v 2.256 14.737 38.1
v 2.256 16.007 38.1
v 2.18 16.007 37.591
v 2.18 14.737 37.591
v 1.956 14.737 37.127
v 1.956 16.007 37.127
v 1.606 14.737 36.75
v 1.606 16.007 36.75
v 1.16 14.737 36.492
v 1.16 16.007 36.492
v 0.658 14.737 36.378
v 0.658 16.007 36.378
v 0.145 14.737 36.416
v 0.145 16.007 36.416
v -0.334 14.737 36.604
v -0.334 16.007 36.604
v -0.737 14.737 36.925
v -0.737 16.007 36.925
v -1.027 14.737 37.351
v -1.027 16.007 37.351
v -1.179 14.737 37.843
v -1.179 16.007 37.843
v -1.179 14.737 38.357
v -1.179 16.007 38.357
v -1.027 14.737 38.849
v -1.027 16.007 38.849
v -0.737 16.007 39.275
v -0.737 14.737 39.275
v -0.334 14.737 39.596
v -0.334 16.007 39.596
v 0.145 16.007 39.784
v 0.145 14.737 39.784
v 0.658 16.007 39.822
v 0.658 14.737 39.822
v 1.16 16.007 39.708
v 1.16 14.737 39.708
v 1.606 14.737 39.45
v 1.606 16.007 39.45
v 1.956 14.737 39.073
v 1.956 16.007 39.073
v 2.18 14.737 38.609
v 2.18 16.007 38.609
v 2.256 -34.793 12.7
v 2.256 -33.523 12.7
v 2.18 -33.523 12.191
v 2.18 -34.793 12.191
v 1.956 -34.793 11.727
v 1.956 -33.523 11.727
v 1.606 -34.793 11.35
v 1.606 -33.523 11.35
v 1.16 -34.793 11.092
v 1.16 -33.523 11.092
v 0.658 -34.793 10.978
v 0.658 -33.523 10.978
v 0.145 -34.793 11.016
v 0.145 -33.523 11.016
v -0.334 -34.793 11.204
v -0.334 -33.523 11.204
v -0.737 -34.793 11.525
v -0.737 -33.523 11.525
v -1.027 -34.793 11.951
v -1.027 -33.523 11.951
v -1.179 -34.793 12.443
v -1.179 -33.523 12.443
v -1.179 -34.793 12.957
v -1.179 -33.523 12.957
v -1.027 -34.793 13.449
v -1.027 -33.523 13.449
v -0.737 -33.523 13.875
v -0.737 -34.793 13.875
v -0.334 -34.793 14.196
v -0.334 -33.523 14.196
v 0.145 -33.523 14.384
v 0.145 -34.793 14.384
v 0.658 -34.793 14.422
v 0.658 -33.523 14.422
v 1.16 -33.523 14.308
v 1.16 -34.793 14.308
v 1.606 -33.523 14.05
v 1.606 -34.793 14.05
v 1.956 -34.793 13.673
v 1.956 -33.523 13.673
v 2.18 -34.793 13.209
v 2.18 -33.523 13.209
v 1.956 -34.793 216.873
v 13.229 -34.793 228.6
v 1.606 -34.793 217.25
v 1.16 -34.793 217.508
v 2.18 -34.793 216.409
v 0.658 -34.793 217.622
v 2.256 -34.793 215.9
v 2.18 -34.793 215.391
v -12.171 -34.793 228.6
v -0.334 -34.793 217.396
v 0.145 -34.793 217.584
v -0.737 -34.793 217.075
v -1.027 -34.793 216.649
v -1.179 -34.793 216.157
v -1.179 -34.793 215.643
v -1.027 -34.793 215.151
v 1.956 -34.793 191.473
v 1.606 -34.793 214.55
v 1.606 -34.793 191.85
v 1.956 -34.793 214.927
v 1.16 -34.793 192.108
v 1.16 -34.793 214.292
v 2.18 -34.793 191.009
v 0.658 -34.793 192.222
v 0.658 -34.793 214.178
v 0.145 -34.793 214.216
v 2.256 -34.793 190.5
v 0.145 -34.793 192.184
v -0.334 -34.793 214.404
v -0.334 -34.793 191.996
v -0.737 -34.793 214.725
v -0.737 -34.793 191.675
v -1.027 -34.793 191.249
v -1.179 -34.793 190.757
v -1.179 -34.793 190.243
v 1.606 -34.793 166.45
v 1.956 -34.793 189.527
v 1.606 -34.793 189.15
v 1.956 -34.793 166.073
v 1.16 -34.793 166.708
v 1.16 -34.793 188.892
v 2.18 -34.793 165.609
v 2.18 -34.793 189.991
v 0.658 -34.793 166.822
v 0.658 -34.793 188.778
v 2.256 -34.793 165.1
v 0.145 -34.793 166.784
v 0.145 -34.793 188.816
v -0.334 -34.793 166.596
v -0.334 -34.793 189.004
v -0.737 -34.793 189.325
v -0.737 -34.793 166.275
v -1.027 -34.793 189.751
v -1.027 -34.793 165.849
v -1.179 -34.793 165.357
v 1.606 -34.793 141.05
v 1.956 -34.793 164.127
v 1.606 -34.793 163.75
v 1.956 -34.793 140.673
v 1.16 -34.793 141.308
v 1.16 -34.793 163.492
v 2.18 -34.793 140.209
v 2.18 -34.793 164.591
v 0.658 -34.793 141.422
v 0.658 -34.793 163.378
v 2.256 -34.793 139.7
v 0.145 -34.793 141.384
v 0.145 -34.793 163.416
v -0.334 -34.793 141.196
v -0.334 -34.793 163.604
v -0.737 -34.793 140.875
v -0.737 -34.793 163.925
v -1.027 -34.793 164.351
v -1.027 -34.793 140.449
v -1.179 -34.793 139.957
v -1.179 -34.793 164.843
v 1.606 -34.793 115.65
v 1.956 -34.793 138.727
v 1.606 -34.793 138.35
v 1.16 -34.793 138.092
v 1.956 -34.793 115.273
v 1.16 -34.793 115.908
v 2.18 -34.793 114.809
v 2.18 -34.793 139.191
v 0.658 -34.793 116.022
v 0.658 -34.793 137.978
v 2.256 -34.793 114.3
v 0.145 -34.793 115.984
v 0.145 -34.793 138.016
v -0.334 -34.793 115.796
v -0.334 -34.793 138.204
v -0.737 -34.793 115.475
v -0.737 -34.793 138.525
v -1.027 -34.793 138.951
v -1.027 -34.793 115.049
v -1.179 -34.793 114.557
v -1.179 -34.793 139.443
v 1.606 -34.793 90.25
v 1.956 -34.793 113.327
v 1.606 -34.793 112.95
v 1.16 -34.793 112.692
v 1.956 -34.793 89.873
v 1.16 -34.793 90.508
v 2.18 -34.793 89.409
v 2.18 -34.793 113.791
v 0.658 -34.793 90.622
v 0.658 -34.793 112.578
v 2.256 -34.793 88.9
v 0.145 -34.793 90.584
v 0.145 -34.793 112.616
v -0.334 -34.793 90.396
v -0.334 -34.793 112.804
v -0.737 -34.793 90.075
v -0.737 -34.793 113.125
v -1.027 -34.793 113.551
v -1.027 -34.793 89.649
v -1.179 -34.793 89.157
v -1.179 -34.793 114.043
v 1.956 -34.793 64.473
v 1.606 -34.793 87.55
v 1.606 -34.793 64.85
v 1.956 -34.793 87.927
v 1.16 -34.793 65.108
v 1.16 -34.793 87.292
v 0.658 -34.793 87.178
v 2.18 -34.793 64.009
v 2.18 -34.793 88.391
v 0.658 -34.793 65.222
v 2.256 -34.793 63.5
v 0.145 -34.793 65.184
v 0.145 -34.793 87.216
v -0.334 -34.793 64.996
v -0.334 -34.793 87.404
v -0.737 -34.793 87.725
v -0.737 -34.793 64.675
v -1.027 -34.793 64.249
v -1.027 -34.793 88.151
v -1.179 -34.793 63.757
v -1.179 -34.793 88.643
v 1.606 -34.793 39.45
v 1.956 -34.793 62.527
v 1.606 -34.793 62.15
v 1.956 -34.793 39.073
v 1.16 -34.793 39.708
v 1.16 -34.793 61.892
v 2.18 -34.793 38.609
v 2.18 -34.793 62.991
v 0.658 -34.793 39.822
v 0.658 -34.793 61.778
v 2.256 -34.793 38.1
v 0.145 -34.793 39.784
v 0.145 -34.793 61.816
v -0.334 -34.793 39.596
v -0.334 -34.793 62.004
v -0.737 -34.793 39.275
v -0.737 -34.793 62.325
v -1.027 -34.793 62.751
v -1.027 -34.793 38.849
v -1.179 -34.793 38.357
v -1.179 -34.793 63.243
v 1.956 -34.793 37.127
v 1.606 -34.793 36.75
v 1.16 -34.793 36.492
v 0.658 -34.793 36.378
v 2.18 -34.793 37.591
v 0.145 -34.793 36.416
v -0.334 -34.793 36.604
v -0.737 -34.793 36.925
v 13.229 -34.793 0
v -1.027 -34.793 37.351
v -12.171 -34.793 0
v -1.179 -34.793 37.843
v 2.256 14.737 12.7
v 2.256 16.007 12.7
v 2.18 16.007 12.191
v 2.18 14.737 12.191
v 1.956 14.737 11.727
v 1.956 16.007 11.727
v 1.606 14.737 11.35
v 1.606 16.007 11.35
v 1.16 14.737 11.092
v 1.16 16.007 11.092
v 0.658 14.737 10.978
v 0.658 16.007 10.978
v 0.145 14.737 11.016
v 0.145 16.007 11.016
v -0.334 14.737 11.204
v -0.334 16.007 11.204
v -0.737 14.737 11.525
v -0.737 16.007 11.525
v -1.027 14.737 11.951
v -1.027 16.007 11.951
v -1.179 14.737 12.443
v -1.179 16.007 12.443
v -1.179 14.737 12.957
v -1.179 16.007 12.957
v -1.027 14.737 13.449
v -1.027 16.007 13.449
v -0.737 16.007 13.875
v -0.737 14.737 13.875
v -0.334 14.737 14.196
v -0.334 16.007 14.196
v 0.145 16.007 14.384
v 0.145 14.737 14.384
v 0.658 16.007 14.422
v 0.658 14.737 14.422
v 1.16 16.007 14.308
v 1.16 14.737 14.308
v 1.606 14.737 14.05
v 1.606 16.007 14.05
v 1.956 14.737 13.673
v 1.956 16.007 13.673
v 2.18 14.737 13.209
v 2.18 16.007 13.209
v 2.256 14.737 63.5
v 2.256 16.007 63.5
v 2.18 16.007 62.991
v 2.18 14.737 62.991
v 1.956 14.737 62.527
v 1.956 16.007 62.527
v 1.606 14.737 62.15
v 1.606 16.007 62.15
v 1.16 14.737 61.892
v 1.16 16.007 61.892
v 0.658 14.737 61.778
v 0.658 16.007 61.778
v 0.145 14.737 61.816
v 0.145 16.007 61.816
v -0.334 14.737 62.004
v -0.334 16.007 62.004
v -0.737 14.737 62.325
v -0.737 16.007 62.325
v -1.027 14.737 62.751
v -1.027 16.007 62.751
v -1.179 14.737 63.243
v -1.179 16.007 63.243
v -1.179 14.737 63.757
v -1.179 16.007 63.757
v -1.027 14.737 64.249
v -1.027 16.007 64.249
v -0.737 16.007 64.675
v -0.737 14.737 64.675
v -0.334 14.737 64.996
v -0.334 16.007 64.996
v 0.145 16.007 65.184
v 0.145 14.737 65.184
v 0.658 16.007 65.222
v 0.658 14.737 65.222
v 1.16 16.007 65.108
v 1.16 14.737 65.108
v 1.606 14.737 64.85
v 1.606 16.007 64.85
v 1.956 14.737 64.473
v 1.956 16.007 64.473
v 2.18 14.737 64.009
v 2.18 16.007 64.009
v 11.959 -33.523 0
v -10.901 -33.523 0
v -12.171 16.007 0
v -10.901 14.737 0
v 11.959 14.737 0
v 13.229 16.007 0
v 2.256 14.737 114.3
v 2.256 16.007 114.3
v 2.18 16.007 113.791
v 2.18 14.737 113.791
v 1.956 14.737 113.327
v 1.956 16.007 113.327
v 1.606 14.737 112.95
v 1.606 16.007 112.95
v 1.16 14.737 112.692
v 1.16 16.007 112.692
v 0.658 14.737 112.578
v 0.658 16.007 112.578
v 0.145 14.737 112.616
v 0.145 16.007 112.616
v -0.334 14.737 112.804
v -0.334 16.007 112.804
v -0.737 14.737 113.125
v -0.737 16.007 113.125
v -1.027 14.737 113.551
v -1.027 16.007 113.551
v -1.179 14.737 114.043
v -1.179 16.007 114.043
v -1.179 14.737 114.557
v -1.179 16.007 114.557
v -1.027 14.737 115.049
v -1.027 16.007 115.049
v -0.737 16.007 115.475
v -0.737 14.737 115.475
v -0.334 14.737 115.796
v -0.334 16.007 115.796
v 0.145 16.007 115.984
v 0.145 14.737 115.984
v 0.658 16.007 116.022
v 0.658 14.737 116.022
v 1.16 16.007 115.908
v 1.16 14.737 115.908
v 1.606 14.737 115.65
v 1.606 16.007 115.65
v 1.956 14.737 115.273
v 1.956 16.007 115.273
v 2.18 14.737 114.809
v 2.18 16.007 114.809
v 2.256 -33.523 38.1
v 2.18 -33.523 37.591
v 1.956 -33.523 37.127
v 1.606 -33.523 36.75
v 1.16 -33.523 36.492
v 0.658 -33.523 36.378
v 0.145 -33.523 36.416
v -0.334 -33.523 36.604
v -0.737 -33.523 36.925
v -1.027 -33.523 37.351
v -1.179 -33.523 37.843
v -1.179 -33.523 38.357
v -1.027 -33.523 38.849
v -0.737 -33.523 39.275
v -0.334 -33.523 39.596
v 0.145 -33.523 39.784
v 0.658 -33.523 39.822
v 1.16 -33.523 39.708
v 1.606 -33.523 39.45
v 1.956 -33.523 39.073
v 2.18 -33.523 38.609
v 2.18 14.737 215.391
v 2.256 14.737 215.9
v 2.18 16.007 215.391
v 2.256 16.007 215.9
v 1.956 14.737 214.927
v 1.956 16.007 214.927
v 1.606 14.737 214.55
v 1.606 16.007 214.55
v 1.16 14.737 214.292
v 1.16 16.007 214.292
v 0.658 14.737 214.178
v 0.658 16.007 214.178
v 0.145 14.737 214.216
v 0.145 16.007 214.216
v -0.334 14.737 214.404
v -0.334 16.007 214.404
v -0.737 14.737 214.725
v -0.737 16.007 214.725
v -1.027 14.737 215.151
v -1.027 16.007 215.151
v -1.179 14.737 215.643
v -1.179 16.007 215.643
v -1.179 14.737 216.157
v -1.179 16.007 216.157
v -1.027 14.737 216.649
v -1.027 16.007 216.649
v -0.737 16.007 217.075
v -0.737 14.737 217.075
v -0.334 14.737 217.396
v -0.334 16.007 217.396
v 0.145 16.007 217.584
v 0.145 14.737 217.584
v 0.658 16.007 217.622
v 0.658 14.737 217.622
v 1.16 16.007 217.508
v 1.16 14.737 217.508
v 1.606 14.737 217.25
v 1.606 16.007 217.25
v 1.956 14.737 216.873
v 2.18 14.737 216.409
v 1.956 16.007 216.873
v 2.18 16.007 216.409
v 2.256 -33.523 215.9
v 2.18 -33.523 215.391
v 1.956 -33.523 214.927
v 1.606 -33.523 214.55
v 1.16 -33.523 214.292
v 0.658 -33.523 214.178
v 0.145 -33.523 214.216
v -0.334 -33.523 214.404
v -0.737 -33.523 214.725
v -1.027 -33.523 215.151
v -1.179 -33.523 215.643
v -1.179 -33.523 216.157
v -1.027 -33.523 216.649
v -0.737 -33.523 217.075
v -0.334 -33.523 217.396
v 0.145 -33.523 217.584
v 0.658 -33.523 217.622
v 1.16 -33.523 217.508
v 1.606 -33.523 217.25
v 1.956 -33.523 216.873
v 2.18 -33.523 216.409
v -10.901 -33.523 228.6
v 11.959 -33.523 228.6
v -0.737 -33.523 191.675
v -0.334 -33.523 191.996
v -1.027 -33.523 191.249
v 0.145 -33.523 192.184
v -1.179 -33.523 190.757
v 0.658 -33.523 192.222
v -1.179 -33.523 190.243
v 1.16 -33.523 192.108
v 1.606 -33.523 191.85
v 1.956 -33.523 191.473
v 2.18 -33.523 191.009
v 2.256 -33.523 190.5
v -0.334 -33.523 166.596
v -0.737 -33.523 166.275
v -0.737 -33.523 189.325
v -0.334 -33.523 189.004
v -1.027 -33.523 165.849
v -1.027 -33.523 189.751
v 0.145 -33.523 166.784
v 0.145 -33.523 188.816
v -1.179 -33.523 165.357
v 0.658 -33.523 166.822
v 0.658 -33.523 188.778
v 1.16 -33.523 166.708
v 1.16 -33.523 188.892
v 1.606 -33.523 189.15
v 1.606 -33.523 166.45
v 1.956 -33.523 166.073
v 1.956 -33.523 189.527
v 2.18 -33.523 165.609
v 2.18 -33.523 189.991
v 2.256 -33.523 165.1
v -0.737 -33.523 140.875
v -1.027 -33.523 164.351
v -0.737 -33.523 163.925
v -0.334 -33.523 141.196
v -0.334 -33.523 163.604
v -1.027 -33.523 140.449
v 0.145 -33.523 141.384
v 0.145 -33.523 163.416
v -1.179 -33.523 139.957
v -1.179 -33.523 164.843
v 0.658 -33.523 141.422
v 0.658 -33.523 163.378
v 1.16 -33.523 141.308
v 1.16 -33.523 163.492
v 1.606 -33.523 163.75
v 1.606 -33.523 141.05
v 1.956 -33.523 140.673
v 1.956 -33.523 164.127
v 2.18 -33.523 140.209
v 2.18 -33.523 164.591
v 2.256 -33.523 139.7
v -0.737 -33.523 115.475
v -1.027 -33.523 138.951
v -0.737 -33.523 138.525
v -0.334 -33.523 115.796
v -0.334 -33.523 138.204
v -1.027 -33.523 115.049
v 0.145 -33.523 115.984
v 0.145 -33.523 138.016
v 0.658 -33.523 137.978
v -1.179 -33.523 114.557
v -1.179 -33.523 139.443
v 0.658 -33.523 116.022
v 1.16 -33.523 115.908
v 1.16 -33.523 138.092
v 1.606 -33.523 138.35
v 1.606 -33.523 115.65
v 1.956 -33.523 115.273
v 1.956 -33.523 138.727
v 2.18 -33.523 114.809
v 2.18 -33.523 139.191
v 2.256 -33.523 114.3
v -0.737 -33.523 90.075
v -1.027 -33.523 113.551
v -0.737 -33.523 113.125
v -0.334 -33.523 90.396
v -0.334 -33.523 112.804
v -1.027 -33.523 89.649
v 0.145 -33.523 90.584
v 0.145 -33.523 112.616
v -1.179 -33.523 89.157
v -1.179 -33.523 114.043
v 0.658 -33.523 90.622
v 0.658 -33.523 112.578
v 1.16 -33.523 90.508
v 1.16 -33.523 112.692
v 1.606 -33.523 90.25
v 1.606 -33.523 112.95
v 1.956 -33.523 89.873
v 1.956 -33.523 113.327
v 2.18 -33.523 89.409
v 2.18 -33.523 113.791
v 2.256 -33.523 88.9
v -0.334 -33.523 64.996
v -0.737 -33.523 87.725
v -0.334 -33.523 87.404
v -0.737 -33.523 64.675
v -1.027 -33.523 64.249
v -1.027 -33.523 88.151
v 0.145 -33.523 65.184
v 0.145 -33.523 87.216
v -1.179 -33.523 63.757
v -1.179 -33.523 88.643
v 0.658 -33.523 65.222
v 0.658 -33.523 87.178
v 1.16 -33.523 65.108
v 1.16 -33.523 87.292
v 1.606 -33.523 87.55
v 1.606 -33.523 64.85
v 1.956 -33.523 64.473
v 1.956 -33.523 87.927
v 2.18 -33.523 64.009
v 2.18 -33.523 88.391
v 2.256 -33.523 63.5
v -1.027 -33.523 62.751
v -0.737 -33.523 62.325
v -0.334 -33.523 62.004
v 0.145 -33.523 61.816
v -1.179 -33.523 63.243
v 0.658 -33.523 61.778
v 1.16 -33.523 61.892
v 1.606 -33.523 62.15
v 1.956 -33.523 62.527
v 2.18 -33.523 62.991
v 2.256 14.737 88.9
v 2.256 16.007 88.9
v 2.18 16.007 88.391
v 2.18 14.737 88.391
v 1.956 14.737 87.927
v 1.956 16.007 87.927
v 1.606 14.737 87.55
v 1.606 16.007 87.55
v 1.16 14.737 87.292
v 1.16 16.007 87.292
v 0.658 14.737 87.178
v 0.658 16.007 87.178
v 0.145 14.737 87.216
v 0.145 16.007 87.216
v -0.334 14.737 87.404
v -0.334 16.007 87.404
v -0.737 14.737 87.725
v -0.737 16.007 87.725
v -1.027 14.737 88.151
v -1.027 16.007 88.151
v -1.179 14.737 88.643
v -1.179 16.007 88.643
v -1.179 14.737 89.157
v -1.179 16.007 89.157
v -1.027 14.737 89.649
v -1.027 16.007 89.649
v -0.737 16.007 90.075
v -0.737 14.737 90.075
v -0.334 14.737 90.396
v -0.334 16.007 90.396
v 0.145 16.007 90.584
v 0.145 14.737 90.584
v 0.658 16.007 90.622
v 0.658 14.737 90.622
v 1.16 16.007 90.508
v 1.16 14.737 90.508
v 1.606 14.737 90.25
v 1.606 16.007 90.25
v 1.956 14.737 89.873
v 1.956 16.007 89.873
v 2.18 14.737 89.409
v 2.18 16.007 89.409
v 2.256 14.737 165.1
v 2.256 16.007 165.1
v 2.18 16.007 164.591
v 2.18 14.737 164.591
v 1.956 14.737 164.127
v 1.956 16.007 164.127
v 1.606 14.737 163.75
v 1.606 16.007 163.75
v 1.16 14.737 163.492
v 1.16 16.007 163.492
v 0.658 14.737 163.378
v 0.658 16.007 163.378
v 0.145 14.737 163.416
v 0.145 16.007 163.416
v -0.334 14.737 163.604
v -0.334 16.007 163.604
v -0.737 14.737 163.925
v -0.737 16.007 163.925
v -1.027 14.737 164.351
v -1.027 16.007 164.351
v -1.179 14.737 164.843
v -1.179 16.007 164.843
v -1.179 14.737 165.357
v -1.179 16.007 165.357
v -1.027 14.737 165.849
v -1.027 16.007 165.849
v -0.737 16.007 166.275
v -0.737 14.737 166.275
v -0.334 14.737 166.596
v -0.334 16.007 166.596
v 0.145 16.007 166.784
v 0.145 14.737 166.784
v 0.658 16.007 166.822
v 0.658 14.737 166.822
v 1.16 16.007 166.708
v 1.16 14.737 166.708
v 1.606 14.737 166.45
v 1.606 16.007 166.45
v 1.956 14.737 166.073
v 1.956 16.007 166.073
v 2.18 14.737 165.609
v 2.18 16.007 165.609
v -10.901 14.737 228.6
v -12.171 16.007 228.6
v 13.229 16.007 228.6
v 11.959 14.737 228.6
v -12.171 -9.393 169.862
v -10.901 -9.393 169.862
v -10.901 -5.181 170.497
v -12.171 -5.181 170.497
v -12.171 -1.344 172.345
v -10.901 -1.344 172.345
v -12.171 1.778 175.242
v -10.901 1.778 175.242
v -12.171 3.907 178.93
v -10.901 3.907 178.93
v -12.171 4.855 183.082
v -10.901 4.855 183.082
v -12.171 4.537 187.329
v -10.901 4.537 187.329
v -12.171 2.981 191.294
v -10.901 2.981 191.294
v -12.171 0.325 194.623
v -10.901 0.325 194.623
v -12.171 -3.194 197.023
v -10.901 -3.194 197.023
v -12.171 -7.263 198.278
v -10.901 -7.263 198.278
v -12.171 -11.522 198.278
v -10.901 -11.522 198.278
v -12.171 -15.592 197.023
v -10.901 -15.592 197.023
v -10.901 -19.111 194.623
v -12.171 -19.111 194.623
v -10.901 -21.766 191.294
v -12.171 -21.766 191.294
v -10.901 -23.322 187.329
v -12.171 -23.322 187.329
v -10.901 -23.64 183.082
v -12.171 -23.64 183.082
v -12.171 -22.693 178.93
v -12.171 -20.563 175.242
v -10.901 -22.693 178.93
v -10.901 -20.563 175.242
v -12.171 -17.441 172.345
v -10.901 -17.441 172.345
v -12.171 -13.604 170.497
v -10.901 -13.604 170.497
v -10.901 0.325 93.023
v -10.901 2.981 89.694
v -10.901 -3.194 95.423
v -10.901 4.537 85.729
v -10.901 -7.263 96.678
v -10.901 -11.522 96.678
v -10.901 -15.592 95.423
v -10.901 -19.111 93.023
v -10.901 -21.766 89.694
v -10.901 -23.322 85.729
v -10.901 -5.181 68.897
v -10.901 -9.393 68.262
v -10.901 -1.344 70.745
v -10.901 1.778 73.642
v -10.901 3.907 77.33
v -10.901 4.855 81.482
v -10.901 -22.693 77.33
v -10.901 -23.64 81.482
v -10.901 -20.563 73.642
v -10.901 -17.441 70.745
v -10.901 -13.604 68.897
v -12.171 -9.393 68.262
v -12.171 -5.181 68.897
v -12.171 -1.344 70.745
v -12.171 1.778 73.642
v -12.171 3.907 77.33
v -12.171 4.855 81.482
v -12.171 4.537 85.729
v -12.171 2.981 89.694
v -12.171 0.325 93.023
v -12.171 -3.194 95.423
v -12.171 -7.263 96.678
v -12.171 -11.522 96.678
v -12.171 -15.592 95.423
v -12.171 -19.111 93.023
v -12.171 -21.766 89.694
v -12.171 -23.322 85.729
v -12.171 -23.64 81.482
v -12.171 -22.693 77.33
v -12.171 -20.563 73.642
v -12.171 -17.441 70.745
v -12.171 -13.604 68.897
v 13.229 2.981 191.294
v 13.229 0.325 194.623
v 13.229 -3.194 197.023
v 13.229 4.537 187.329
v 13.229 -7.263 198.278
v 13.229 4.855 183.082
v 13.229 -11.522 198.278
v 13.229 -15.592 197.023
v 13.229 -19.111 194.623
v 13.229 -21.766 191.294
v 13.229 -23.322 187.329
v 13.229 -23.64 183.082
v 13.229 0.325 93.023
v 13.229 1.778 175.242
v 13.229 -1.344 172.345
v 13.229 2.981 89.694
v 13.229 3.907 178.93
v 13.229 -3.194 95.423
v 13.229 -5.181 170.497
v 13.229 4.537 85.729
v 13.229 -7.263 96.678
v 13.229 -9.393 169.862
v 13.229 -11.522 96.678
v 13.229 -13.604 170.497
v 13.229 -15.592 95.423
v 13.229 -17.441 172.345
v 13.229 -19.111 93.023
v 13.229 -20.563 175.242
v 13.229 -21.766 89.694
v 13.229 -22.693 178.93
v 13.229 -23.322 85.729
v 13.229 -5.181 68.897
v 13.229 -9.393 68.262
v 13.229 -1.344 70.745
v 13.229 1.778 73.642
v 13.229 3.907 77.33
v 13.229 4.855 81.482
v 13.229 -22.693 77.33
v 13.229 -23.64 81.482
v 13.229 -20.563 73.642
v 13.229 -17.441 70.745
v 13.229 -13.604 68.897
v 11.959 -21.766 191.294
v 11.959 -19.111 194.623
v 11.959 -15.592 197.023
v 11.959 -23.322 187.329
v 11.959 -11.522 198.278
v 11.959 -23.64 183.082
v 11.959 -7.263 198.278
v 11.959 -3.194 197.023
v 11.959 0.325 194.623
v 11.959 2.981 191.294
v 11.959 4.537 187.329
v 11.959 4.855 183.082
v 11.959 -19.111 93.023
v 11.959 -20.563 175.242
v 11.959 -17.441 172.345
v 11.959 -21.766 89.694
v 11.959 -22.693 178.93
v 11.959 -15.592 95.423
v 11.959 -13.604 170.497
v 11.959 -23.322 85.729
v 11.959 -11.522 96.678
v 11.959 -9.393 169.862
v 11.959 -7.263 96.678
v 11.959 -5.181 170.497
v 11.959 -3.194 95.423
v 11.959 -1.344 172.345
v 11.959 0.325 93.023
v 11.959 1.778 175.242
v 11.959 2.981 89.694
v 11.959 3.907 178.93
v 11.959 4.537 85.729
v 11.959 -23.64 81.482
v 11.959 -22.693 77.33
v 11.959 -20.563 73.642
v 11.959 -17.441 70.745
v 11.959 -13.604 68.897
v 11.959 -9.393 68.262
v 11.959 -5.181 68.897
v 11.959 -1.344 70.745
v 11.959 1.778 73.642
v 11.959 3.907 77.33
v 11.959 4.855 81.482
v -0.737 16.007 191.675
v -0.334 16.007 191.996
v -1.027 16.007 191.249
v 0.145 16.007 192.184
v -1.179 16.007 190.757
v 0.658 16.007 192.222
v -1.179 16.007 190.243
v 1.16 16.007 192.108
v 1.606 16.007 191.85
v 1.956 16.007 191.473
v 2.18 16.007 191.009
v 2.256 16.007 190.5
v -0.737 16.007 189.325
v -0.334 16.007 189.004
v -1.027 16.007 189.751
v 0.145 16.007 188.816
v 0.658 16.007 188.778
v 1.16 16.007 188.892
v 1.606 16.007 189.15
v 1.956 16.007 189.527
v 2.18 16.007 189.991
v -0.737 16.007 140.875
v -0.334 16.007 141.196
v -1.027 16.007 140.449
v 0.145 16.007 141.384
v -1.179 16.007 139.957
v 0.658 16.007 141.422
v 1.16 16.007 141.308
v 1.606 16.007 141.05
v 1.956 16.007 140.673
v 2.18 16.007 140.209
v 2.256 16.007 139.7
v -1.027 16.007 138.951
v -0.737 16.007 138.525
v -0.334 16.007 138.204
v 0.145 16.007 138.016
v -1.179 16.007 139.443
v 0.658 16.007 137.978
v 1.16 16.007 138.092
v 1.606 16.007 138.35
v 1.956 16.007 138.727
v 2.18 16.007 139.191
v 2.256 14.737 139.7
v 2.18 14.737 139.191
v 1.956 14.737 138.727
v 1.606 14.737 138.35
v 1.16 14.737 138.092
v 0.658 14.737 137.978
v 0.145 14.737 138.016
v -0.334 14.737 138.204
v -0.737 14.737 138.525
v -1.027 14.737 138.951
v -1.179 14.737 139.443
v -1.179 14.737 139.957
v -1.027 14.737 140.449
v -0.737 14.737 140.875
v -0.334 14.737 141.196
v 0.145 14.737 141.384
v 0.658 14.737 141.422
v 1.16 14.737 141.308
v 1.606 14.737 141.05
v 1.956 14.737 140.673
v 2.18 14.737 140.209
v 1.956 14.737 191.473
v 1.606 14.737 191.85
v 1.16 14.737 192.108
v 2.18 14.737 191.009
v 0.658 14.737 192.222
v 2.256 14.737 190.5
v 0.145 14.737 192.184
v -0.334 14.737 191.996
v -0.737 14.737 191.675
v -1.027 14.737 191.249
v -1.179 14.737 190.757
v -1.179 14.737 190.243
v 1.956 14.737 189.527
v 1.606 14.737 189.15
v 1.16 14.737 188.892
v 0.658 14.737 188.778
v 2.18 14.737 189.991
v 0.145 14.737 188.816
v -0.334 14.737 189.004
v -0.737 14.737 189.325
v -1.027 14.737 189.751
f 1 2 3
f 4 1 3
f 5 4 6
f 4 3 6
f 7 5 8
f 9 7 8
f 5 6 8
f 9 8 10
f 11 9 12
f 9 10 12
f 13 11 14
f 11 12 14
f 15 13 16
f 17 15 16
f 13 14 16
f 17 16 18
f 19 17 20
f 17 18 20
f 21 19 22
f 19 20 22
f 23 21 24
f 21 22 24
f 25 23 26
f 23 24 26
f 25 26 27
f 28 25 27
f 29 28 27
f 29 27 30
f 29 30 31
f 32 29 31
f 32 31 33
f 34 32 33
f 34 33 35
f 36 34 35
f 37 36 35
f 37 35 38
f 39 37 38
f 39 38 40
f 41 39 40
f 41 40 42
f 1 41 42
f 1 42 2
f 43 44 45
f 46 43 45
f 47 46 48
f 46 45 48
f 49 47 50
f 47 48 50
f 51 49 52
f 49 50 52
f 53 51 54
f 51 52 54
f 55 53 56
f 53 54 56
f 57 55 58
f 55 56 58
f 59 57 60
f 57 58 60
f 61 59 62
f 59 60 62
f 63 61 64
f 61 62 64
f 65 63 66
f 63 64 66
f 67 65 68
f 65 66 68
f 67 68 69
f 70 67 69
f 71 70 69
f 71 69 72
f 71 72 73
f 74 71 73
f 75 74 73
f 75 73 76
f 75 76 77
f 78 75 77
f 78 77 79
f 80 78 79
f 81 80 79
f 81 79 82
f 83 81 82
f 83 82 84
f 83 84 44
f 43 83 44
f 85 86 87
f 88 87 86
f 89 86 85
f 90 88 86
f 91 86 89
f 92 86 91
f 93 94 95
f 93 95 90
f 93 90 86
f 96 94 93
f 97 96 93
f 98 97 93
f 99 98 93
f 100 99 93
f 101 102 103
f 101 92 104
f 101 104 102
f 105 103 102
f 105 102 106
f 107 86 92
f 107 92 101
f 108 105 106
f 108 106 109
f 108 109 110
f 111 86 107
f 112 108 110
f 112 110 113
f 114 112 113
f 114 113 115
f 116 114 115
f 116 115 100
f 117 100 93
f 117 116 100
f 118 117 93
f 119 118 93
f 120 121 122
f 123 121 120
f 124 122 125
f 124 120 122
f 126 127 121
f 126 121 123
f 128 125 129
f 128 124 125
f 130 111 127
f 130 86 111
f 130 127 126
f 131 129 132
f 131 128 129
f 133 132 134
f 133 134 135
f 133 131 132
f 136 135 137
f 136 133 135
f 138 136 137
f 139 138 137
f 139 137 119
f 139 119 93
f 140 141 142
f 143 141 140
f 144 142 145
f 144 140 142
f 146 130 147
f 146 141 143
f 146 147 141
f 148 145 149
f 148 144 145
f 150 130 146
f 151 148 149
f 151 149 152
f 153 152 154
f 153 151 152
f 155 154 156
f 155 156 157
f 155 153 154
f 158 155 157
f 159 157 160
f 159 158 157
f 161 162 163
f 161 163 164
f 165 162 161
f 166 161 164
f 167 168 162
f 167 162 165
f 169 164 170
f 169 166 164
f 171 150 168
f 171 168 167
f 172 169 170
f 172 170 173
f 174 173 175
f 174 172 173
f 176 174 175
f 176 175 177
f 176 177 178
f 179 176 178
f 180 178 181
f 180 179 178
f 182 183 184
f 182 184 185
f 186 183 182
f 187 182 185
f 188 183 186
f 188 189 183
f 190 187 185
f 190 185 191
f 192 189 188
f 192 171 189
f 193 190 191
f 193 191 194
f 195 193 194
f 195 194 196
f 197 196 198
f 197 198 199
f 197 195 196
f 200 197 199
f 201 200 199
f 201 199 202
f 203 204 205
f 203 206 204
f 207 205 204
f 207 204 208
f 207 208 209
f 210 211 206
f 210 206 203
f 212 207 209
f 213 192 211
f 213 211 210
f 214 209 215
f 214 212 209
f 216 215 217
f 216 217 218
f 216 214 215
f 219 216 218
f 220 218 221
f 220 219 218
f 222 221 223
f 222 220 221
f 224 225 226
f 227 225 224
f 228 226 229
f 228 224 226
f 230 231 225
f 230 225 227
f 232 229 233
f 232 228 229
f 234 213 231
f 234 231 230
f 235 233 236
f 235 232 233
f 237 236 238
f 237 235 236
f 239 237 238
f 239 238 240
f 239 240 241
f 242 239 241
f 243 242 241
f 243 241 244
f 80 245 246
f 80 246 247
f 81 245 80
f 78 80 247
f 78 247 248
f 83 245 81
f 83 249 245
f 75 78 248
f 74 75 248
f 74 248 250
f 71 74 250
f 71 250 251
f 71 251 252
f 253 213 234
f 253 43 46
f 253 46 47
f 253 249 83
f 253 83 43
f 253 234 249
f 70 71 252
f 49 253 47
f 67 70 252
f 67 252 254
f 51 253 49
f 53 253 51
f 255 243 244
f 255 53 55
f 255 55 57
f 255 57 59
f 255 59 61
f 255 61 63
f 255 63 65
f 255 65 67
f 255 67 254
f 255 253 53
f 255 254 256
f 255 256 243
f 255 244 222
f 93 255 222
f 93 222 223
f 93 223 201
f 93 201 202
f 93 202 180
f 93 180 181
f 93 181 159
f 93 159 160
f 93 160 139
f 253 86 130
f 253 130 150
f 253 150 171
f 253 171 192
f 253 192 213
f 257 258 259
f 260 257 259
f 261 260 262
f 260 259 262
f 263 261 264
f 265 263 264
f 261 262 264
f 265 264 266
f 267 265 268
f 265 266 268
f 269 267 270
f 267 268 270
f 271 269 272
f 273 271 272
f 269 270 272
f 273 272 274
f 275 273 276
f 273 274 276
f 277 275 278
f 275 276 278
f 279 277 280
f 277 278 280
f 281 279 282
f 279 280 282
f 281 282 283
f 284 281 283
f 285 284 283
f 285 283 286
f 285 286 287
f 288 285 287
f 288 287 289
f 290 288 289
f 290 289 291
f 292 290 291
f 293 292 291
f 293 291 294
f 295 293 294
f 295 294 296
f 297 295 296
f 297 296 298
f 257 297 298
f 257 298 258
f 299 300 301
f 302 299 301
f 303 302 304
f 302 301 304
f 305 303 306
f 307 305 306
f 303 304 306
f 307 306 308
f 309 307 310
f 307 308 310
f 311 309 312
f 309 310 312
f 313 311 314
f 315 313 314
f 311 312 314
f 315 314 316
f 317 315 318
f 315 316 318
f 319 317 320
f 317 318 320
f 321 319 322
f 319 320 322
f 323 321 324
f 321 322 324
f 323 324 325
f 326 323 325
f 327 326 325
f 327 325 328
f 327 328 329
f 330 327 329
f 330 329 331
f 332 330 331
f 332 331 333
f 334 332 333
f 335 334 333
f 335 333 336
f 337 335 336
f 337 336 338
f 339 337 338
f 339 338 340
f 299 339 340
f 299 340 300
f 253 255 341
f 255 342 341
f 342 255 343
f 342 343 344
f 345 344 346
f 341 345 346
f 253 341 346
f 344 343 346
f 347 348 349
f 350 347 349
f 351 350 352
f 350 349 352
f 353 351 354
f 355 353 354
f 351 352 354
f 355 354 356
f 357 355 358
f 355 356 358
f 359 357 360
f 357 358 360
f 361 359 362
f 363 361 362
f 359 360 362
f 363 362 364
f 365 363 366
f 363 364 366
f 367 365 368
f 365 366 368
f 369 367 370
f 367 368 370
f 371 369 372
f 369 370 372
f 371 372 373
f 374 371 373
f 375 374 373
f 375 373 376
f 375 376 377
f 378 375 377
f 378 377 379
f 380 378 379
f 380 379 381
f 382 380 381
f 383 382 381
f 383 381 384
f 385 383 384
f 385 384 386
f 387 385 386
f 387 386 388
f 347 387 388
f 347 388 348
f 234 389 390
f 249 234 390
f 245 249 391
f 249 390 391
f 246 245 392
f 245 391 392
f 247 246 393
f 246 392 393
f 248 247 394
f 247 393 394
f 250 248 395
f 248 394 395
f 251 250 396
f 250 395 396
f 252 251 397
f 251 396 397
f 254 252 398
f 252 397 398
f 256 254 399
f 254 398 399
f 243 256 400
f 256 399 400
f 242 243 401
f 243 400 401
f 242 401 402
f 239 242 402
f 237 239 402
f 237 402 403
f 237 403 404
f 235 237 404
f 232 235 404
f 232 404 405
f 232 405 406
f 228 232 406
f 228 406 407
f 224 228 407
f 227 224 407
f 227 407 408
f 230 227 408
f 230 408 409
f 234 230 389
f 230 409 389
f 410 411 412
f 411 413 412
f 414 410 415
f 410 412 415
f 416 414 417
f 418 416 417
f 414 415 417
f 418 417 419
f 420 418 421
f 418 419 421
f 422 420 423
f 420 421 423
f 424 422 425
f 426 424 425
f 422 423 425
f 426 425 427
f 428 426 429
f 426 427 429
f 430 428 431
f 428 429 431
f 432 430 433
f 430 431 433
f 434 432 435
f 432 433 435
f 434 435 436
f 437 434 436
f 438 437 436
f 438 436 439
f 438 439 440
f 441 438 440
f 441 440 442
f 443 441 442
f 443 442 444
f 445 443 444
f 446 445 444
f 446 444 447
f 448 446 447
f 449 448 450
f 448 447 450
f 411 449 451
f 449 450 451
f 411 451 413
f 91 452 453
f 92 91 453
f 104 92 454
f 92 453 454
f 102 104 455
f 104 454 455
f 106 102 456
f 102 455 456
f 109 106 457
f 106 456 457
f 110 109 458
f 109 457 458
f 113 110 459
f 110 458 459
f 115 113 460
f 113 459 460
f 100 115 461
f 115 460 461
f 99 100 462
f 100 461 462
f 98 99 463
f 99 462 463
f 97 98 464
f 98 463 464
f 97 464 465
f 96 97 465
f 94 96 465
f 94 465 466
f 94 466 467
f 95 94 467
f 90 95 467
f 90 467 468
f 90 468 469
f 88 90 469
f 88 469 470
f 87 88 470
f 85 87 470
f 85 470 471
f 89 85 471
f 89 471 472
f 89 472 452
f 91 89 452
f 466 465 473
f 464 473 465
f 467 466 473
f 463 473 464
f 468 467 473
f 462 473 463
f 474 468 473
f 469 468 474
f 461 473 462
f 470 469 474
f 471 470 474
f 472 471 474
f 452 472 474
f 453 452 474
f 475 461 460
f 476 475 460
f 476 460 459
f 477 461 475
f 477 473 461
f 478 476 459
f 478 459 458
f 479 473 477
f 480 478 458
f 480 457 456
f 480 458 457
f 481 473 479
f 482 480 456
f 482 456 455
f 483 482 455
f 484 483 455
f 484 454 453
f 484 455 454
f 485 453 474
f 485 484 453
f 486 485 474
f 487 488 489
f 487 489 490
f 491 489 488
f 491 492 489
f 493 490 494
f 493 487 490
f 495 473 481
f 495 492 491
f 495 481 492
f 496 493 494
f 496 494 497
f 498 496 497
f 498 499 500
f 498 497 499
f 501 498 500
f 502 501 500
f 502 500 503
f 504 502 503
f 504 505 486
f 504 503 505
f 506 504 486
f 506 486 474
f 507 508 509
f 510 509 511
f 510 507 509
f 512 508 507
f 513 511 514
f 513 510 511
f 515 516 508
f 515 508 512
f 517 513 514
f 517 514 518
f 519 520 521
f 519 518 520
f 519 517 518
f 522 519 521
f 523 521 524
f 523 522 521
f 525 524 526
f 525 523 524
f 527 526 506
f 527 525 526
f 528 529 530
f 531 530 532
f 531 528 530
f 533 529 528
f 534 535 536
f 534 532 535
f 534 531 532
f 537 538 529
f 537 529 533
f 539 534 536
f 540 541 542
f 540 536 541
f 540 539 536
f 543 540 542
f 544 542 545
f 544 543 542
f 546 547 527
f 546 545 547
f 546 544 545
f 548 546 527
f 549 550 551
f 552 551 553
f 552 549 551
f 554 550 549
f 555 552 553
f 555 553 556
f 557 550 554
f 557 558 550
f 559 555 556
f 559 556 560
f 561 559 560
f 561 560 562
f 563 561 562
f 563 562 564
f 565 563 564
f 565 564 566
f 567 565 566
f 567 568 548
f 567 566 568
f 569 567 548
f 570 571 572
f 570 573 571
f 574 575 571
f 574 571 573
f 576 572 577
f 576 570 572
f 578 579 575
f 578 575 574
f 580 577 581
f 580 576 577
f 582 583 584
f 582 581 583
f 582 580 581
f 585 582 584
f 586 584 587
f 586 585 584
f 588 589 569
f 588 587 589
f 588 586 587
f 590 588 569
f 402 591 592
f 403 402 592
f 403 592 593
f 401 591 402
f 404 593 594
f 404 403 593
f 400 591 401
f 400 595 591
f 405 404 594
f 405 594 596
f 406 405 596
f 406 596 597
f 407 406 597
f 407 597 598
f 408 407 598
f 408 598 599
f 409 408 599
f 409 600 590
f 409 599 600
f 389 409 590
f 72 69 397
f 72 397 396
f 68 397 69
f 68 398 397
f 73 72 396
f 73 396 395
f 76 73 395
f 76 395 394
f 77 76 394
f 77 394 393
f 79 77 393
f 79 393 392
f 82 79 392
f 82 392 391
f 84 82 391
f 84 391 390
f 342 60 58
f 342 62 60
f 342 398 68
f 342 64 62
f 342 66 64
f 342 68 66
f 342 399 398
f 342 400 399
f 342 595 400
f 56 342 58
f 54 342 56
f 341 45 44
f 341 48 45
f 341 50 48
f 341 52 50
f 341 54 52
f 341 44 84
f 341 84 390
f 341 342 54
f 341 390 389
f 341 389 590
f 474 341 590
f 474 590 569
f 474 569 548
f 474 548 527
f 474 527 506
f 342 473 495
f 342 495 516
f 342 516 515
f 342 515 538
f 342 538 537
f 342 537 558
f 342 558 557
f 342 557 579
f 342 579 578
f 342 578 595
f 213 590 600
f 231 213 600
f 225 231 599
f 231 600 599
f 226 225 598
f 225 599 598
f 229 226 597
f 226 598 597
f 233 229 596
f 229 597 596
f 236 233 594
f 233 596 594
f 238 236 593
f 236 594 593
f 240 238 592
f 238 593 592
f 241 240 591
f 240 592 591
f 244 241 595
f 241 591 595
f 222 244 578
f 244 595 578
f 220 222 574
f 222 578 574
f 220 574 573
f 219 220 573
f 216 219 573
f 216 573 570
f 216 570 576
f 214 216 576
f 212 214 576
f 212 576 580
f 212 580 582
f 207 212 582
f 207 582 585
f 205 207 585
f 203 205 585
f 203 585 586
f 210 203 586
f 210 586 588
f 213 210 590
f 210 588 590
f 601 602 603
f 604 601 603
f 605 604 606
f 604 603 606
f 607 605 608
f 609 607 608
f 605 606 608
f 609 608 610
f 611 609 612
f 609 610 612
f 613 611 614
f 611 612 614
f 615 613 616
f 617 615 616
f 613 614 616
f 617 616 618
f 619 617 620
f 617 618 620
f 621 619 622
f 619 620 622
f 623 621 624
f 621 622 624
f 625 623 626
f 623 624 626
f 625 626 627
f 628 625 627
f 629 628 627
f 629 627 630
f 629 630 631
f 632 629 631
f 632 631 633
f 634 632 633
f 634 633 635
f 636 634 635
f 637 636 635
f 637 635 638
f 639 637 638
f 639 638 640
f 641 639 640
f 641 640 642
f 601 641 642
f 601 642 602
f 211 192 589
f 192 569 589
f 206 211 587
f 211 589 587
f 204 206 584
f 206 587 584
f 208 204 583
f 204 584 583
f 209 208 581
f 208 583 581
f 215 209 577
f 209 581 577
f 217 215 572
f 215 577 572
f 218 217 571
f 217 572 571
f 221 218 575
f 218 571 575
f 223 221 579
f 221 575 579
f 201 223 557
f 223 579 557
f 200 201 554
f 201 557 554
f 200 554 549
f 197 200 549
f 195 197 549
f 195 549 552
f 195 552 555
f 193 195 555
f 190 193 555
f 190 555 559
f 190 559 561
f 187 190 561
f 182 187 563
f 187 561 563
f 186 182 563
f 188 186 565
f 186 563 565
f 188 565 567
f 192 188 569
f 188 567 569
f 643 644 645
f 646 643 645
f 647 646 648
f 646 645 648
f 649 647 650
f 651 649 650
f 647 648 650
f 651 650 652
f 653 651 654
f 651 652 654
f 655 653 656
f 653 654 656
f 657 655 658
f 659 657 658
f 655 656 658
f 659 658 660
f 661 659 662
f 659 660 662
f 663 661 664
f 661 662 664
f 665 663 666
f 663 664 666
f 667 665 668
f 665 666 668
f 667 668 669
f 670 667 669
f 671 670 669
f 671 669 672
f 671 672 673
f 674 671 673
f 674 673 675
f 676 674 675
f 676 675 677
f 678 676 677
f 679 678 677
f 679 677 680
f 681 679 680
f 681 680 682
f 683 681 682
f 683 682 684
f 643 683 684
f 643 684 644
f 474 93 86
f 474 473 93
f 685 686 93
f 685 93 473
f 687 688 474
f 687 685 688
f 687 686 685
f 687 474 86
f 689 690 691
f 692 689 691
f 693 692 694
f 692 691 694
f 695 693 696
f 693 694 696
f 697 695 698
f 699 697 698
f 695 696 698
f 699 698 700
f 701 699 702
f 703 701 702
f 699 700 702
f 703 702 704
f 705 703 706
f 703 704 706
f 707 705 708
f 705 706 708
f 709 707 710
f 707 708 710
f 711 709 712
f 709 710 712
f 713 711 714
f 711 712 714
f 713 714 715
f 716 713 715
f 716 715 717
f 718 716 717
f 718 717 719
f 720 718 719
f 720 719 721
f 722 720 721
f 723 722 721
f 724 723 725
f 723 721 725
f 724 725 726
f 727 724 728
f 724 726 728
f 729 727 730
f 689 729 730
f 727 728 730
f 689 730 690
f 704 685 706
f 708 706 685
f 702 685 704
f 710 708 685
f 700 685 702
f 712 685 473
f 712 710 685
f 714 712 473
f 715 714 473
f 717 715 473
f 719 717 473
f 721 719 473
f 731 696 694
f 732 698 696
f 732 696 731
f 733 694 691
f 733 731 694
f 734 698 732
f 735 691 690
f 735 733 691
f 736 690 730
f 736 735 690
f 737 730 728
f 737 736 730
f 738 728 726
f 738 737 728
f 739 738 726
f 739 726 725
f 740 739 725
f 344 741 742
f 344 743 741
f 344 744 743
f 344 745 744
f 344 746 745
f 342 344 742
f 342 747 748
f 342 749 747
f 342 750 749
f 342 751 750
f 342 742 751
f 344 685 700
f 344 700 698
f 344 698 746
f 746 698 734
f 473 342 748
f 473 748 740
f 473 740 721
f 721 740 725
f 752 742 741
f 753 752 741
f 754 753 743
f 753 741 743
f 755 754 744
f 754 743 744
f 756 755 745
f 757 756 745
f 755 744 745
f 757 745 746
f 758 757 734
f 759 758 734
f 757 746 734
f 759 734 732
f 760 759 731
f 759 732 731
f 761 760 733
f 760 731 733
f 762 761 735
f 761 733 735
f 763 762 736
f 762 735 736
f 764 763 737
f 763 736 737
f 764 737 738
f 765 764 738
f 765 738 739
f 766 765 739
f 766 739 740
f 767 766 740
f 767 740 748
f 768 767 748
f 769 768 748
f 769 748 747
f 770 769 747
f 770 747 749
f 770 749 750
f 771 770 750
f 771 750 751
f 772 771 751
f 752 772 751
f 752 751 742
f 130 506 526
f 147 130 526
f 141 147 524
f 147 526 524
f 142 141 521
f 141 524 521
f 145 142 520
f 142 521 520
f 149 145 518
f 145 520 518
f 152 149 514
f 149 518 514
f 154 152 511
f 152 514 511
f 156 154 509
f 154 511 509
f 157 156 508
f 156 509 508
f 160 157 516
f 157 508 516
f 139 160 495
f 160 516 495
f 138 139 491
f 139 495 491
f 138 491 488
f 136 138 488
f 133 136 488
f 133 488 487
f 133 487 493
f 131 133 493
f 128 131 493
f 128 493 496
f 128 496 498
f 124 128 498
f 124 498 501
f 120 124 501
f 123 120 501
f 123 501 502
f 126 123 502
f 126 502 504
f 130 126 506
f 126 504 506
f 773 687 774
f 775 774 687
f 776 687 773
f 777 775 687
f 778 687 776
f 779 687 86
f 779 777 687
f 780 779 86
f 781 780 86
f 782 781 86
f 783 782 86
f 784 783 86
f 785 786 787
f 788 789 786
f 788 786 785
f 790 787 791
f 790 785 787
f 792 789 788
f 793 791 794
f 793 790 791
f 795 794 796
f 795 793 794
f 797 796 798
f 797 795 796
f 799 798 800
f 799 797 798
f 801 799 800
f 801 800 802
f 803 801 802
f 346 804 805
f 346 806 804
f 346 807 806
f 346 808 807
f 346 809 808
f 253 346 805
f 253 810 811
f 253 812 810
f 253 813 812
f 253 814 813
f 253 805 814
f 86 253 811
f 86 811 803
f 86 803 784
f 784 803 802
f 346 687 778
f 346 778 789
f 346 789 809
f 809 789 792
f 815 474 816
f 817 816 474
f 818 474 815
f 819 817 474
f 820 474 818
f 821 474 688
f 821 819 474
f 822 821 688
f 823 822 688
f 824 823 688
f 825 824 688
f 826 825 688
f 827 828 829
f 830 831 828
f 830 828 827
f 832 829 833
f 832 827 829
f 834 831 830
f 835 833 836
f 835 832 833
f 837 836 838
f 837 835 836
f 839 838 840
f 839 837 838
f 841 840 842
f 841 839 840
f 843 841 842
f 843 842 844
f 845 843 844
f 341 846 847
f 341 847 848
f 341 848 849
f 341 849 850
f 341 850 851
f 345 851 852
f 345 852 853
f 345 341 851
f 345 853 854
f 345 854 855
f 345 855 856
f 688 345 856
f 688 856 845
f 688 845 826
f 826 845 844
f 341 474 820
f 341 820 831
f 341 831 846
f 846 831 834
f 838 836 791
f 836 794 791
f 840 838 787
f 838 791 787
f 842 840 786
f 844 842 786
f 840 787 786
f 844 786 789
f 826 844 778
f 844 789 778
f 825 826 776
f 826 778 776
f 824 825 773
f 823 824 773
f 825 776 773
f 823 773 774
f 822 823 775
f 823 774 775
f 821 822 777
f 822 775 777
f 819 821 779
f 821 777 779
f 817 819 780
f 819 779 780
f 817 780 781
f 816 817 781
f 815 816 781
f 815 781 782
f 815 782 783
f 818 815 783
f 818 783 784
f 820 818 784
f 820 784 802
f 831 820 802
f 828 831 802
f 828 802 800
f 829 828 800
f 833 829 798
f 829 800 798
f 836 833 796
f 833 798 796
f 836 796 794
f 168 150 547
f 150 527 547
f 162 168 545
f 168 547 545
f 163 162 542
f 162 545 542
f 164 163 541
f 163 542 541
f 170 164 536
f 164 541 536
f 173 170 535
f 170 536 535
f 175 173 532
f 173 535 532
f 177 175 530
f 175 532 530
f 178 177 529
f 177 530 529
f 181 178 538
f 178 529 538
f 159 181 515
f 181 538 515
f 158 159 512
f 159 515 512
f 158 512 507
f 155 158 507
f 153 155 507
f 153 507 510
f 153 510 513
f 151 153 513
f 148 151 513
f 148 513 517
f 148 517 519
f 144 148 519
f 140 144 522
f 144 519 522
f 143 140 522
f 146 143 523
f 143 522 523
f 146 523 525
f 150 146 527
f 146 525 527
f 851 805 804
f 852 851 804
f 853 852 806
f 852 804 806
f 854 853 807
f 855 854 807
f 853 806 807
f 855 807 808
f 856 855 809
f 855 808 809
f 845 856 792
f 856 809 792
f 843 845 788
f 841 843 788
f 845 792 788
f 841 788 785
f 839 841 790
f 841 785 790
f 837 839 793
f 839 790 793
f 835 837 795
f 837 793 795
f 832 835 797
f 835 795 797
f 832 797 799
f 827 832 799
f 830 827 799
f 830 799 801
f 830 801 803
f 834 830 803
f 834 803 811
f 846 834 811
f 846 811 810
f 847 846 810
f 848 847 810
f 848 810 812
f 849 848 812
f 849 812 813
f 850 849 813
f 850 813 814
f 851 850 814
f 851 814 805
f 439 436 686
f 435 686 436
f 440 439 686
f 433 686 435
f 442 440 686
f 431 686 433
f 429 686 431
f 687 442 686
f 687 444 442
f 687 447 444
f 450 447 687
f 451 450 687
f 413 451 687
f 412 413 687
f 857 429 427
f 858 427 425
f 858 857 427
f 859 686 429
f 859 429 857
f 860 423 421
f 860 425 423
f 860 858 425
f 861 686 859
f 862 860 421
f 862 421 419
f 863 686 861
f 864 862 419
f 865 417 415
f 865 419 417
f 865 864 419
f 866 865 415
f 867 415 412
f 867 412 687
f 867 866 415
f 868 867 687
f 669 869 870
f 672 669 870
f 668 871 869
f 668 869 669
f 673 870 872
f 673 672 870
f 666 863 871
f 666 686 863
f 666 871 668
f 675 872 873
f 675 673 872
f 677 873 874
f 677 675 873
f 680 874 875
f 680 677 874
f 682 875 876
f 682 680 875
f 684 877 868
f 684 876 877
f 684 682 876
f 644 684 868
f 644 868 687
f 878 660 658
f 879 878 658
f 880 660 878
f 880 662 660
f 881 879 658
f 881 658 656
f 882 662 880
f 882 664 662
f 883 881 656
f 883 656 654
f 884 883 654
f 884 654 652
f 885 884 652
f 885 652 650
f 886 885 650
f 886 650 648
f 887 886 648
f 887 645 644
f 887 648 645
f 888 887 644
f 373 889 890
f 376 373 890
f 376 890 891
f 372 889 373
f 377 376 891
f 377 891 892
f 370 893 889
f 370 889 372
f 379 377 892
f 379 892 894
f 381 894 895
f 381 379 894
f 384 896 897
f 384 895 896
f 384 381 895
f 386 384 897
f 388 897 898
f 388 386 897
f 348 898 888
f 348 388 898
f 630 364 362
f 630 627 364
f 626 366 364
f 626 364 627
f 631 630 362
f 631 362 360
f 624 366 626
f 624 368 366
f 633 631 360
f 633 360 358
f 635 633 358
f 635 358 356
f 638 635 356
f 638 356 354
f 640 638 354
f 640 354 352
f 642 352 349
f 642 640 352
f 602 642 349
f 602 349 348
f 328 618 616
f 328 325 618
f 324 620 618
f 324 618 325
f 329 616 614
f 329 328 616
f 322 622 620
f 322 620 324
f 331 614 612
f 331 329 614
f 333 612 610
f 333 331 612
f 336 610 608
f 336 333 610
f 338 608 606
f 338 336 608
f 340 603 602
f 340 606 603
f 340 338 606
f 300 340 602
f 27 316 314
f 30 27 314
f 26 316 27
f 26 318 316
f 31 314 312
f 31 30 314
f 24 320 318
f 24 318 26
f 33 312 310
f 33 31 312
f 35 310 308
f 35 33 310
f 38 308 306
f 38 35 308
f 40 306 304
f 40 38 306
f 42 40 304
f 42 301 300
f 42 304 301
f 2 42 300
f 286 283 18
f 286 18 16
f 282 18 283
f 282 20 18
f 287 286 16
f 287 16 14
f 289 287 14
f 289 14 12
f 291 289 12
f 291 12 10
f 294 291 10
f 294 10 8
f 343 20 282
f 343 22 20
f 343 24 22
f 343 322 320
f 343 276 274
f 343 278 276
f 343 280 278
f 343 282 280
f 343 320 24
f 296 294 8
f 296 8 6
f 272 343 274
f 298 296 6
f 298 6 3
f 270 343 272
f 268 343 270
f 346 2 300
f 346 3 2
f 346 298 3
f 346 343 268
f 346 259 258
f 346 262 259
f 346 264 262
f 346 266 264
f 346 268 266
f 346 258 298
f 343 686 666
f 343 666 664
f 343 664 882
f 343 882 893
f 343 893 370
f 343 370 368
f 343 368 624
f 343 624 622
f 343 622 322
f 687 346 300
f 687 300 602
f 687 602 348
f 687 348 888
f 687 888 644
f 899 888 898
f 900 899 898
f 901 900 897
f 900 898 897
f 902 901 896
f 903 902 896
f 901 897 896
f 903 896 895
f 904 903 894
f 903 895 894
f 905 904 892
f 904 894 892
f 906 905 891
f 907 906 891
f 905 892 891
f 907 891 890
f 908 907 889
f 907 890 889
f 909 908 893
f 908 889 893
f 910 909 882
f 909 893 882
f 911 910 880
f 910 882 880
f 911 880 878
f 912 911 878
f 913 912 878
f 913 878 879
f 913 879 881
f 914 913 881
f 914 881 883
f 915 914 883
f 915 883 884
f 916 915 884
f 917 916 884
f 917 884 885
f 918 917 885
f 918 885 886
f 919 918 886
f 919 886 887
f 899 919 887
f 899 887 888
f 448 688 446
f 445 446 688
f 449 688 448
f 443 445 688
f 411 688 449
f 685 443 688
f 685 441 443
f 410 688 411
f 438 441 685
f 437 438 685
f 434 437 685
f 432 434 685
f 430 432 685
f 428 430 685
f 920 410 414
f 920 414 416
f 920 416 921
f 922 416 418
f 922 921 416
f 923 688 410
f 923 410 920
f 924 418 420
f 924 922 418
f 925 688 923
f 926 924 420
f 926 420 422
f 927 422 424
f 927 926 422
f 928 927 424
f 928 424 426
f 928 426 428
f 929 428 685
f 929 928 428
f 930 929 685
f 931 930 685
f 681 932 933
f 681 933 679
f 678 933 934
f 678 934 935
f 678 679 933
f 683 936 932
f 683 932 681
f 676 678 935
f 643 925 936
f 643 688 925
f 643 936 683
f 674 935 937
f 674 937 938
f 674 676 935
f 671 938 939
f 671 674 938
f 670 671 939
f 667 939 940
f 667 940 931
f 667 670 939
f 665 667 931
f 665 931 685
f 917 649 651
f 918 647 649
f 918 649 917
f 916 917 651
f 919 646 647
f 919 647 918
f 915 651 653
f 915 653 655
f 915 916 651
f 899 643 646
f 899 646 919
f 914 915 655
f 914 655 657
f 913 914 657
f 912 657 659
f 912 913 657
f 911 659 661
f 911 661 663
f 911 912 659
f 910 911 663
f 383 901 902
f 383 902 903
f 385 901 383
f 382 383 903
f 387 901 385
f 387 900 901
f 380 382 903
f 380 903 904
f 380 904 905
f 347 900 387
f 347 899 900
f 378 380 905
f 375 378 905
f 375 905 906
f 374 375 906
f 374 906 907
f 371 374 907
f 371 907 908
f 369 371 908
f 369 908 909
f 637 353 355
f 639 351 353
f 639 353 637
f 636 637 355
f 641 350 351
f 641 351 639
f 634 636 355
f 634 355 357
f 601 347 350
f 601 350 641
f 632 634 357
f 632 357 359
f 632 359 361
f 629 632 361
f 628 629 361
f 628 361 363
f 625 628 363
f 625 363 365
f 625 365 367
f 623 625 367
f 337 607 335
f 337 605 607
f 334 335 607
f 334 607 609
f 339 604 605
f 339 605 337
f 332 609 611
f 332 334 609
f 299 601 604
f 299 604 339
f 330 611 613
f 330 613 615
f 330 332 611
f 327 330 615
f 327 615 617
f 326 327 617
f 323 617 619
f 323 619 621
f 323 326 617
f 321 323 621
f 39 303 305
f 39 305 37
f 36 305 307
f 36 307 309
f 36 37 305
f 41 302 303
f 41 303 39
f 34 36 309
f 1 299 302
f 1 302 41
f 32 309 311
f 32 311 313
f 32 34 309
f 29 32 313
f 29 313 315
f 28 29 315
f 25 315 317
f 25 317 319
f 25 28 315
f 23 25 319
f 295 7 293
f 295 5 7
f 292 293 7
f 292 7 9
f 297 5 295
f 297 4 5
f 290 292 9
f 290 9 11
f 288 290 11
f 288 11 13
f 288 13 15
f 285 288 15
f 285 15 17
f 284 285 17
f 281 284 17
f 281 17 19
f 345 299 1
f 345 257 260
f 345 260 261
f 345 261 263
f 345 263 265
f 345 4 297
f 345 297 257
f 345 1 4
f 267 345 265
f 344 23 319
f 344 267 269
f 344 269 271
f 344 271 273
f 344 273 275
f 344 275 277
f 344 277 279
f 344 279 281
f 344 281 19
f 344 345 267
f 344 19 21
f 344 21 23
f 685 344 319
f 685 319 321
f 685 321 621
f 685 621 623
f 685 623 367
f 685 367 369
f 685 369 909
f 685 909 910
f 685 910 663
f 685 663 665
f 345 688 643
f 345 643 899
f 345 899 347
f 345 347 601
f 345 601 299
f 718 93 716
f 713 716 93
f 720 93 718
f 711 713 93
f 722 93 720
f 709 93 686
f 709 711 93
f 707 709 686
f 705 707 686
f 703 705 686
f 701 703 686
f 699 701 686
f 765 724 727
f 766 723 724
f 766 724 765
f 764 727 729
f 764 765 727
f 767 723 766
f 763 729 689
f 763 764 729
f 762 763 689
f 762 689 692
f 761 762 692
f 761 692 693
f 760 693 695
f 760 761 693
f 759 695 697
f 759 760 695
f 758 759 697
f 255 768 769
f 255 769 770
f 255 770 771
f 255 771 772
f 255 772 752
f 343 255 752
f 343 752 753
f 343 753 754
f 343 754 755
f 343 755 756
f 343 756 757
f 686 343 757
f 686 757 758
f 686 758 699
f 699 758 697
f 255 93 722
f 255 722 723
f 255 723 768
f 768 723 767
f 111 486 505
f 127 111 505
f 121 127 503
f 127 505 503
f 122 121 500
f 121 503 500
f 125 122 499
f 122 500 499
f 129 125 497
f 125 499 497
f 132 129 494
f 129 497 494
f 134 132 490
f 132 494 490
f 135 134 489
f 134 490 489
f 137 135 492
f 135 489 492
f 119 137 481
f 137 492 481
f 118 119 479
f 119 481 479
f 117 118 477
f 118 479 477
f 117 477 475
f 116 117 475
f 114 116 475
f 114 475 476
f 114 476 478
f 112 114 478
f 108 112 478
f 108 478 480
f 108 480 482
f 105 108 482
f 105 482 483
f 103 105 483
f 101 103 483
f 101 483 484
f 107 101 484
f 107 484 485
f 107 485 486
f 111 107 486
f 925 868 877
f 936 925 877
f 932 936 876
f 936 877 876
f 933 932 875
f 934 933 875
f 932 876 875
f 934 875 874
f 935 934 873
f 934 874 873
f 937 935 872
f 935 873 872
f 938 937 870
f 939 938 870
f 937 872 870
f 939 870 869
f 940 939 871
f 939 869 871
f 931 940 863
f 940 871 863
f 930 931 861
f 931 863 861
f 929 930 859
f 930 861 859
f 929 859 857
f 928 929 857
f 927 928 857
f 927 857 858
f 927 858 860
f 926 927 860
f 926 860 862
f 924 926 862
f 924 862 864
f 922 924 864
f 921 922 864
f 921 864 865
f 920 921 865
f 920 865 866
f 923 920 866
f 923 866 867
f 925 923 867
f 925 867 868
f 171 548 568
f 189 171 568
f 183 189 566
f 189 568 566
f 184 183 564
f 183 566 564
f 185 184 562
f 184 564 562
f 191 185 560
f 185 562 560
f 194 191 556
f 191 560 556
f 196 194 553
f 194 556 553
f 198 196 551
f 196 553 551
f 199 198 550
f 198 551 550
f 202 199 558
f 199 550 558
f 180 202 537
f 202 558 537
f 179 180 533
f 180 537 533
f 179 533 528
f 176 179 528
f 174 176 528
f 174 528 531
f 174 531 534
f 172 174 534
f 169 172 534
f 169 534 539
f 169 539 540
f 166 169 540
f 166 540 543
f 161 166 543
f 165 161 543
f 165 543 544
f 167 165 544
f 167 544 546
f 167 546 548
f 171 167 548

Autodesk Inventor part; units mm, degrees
ref_plane "YZ Plane" through (0, 0, 0) normal (1, 0, 0) x (0, 1, 0)
ref_plane "XZ Plane" through (0, 0, 0) normal (0, 1, 0) x (-1, 0, 0)
ref_plane "XY Plane" through (0, 0, 0) normal (0, 0, 1) x (1, 0, 0)
sketch "Sketch1" plane through (0, 0, 0) normal (0, 0, 1) x (1, 0, 0)
  line L0 (-12.1708, 16.0073) -> (13.2292, 16.0073)
  line L1 (13.2292, 16.0073) -> (13.2292, -34.7927)
  line L2 (13.2292, -34.7927) -> (-12.1708, -34.7927)
  line L3 (-12.1708, -34.7927) -> (-12.1708, 16.0073)
  line L4 (11.9592, 14.7373) -> (-10.9008, 14.7373)
  line L5 (-10.9008, 14.7373) -> (-10.9008, -33.5227)
  line L6 (-10.9008, -33.5227) -> (11.9592, -33.5227)
  line L7 (11.9592, -33.5227) -> (11.9592, 14.7373)
  point P0 (0, 0)
  dimension "d0" = 25.4
  dimension "d1" = 50.8
  dimension "d2" = 1.27
extrude "Extrusion1" add sketch "Sketch1" along normal blind 228.6
sketch "Sketch2" plane through (-12.1708, 16.0073, 0) normal (0, 1, 0) x (1, 0, 0)
  circle A0 centre (12.7, -12.7) radius 1.7272
  line L0 (25.4, 0) -> (0, 0) projected
  line L1 (0, 0) -> (0, -228.6) projected
  point P0 (12.1708, 0)
  dimension "d5" = 3.4544
  dimension "d6" = 12.7
  dimension "d7" = 12.7
extrude "Extrusion2" cut sketch "Sketch2" against normal through all
pattern_linear "Rectangular Pattern1" count 71 spacing 25.4 along (0, 0, 1) of "Extrusion2"
sketch "Sketch4" plane through (13.2292, -34.7927, 0) normal (1, 0, 0) x (0, 0, -1)
  circle A0 centre (-82.55, 25.4) radius 14.2875
  line L0 (0, 50.8) -> (-228.6, 50.8) projected
  line L1 (0, 0) -> (0, 50.8) projected
  line L2 (0, 50.8) -> (-228.6, 50.8) projected
  line L3 (-228.6, 0) -> (-228.6, 50.8) projected
  line L4 (0, 0) -> (-228.6, 0) projected
  circle A1 centre (-184.15, 25.4) radius 14.2875
  point P0 (0, 34.7927)
  point P1 (0, 25.4)
  dimension "d31" = 28.575
  dimension "d34" = 28.575
  dimension "d35" = 44.45
  dimension "d36" = 25.4
  dimension "d39" = 101.6
extrude "Extrusion4" cut sketch "Sketch4" against normal blind 25.4 contours A0 | A1
equation "\"d10\" = d14"
equation "\"d13\" = 711.2"
equation "\"d14\" = d13"
properties part number "VersaFrame_VelcRail2"
